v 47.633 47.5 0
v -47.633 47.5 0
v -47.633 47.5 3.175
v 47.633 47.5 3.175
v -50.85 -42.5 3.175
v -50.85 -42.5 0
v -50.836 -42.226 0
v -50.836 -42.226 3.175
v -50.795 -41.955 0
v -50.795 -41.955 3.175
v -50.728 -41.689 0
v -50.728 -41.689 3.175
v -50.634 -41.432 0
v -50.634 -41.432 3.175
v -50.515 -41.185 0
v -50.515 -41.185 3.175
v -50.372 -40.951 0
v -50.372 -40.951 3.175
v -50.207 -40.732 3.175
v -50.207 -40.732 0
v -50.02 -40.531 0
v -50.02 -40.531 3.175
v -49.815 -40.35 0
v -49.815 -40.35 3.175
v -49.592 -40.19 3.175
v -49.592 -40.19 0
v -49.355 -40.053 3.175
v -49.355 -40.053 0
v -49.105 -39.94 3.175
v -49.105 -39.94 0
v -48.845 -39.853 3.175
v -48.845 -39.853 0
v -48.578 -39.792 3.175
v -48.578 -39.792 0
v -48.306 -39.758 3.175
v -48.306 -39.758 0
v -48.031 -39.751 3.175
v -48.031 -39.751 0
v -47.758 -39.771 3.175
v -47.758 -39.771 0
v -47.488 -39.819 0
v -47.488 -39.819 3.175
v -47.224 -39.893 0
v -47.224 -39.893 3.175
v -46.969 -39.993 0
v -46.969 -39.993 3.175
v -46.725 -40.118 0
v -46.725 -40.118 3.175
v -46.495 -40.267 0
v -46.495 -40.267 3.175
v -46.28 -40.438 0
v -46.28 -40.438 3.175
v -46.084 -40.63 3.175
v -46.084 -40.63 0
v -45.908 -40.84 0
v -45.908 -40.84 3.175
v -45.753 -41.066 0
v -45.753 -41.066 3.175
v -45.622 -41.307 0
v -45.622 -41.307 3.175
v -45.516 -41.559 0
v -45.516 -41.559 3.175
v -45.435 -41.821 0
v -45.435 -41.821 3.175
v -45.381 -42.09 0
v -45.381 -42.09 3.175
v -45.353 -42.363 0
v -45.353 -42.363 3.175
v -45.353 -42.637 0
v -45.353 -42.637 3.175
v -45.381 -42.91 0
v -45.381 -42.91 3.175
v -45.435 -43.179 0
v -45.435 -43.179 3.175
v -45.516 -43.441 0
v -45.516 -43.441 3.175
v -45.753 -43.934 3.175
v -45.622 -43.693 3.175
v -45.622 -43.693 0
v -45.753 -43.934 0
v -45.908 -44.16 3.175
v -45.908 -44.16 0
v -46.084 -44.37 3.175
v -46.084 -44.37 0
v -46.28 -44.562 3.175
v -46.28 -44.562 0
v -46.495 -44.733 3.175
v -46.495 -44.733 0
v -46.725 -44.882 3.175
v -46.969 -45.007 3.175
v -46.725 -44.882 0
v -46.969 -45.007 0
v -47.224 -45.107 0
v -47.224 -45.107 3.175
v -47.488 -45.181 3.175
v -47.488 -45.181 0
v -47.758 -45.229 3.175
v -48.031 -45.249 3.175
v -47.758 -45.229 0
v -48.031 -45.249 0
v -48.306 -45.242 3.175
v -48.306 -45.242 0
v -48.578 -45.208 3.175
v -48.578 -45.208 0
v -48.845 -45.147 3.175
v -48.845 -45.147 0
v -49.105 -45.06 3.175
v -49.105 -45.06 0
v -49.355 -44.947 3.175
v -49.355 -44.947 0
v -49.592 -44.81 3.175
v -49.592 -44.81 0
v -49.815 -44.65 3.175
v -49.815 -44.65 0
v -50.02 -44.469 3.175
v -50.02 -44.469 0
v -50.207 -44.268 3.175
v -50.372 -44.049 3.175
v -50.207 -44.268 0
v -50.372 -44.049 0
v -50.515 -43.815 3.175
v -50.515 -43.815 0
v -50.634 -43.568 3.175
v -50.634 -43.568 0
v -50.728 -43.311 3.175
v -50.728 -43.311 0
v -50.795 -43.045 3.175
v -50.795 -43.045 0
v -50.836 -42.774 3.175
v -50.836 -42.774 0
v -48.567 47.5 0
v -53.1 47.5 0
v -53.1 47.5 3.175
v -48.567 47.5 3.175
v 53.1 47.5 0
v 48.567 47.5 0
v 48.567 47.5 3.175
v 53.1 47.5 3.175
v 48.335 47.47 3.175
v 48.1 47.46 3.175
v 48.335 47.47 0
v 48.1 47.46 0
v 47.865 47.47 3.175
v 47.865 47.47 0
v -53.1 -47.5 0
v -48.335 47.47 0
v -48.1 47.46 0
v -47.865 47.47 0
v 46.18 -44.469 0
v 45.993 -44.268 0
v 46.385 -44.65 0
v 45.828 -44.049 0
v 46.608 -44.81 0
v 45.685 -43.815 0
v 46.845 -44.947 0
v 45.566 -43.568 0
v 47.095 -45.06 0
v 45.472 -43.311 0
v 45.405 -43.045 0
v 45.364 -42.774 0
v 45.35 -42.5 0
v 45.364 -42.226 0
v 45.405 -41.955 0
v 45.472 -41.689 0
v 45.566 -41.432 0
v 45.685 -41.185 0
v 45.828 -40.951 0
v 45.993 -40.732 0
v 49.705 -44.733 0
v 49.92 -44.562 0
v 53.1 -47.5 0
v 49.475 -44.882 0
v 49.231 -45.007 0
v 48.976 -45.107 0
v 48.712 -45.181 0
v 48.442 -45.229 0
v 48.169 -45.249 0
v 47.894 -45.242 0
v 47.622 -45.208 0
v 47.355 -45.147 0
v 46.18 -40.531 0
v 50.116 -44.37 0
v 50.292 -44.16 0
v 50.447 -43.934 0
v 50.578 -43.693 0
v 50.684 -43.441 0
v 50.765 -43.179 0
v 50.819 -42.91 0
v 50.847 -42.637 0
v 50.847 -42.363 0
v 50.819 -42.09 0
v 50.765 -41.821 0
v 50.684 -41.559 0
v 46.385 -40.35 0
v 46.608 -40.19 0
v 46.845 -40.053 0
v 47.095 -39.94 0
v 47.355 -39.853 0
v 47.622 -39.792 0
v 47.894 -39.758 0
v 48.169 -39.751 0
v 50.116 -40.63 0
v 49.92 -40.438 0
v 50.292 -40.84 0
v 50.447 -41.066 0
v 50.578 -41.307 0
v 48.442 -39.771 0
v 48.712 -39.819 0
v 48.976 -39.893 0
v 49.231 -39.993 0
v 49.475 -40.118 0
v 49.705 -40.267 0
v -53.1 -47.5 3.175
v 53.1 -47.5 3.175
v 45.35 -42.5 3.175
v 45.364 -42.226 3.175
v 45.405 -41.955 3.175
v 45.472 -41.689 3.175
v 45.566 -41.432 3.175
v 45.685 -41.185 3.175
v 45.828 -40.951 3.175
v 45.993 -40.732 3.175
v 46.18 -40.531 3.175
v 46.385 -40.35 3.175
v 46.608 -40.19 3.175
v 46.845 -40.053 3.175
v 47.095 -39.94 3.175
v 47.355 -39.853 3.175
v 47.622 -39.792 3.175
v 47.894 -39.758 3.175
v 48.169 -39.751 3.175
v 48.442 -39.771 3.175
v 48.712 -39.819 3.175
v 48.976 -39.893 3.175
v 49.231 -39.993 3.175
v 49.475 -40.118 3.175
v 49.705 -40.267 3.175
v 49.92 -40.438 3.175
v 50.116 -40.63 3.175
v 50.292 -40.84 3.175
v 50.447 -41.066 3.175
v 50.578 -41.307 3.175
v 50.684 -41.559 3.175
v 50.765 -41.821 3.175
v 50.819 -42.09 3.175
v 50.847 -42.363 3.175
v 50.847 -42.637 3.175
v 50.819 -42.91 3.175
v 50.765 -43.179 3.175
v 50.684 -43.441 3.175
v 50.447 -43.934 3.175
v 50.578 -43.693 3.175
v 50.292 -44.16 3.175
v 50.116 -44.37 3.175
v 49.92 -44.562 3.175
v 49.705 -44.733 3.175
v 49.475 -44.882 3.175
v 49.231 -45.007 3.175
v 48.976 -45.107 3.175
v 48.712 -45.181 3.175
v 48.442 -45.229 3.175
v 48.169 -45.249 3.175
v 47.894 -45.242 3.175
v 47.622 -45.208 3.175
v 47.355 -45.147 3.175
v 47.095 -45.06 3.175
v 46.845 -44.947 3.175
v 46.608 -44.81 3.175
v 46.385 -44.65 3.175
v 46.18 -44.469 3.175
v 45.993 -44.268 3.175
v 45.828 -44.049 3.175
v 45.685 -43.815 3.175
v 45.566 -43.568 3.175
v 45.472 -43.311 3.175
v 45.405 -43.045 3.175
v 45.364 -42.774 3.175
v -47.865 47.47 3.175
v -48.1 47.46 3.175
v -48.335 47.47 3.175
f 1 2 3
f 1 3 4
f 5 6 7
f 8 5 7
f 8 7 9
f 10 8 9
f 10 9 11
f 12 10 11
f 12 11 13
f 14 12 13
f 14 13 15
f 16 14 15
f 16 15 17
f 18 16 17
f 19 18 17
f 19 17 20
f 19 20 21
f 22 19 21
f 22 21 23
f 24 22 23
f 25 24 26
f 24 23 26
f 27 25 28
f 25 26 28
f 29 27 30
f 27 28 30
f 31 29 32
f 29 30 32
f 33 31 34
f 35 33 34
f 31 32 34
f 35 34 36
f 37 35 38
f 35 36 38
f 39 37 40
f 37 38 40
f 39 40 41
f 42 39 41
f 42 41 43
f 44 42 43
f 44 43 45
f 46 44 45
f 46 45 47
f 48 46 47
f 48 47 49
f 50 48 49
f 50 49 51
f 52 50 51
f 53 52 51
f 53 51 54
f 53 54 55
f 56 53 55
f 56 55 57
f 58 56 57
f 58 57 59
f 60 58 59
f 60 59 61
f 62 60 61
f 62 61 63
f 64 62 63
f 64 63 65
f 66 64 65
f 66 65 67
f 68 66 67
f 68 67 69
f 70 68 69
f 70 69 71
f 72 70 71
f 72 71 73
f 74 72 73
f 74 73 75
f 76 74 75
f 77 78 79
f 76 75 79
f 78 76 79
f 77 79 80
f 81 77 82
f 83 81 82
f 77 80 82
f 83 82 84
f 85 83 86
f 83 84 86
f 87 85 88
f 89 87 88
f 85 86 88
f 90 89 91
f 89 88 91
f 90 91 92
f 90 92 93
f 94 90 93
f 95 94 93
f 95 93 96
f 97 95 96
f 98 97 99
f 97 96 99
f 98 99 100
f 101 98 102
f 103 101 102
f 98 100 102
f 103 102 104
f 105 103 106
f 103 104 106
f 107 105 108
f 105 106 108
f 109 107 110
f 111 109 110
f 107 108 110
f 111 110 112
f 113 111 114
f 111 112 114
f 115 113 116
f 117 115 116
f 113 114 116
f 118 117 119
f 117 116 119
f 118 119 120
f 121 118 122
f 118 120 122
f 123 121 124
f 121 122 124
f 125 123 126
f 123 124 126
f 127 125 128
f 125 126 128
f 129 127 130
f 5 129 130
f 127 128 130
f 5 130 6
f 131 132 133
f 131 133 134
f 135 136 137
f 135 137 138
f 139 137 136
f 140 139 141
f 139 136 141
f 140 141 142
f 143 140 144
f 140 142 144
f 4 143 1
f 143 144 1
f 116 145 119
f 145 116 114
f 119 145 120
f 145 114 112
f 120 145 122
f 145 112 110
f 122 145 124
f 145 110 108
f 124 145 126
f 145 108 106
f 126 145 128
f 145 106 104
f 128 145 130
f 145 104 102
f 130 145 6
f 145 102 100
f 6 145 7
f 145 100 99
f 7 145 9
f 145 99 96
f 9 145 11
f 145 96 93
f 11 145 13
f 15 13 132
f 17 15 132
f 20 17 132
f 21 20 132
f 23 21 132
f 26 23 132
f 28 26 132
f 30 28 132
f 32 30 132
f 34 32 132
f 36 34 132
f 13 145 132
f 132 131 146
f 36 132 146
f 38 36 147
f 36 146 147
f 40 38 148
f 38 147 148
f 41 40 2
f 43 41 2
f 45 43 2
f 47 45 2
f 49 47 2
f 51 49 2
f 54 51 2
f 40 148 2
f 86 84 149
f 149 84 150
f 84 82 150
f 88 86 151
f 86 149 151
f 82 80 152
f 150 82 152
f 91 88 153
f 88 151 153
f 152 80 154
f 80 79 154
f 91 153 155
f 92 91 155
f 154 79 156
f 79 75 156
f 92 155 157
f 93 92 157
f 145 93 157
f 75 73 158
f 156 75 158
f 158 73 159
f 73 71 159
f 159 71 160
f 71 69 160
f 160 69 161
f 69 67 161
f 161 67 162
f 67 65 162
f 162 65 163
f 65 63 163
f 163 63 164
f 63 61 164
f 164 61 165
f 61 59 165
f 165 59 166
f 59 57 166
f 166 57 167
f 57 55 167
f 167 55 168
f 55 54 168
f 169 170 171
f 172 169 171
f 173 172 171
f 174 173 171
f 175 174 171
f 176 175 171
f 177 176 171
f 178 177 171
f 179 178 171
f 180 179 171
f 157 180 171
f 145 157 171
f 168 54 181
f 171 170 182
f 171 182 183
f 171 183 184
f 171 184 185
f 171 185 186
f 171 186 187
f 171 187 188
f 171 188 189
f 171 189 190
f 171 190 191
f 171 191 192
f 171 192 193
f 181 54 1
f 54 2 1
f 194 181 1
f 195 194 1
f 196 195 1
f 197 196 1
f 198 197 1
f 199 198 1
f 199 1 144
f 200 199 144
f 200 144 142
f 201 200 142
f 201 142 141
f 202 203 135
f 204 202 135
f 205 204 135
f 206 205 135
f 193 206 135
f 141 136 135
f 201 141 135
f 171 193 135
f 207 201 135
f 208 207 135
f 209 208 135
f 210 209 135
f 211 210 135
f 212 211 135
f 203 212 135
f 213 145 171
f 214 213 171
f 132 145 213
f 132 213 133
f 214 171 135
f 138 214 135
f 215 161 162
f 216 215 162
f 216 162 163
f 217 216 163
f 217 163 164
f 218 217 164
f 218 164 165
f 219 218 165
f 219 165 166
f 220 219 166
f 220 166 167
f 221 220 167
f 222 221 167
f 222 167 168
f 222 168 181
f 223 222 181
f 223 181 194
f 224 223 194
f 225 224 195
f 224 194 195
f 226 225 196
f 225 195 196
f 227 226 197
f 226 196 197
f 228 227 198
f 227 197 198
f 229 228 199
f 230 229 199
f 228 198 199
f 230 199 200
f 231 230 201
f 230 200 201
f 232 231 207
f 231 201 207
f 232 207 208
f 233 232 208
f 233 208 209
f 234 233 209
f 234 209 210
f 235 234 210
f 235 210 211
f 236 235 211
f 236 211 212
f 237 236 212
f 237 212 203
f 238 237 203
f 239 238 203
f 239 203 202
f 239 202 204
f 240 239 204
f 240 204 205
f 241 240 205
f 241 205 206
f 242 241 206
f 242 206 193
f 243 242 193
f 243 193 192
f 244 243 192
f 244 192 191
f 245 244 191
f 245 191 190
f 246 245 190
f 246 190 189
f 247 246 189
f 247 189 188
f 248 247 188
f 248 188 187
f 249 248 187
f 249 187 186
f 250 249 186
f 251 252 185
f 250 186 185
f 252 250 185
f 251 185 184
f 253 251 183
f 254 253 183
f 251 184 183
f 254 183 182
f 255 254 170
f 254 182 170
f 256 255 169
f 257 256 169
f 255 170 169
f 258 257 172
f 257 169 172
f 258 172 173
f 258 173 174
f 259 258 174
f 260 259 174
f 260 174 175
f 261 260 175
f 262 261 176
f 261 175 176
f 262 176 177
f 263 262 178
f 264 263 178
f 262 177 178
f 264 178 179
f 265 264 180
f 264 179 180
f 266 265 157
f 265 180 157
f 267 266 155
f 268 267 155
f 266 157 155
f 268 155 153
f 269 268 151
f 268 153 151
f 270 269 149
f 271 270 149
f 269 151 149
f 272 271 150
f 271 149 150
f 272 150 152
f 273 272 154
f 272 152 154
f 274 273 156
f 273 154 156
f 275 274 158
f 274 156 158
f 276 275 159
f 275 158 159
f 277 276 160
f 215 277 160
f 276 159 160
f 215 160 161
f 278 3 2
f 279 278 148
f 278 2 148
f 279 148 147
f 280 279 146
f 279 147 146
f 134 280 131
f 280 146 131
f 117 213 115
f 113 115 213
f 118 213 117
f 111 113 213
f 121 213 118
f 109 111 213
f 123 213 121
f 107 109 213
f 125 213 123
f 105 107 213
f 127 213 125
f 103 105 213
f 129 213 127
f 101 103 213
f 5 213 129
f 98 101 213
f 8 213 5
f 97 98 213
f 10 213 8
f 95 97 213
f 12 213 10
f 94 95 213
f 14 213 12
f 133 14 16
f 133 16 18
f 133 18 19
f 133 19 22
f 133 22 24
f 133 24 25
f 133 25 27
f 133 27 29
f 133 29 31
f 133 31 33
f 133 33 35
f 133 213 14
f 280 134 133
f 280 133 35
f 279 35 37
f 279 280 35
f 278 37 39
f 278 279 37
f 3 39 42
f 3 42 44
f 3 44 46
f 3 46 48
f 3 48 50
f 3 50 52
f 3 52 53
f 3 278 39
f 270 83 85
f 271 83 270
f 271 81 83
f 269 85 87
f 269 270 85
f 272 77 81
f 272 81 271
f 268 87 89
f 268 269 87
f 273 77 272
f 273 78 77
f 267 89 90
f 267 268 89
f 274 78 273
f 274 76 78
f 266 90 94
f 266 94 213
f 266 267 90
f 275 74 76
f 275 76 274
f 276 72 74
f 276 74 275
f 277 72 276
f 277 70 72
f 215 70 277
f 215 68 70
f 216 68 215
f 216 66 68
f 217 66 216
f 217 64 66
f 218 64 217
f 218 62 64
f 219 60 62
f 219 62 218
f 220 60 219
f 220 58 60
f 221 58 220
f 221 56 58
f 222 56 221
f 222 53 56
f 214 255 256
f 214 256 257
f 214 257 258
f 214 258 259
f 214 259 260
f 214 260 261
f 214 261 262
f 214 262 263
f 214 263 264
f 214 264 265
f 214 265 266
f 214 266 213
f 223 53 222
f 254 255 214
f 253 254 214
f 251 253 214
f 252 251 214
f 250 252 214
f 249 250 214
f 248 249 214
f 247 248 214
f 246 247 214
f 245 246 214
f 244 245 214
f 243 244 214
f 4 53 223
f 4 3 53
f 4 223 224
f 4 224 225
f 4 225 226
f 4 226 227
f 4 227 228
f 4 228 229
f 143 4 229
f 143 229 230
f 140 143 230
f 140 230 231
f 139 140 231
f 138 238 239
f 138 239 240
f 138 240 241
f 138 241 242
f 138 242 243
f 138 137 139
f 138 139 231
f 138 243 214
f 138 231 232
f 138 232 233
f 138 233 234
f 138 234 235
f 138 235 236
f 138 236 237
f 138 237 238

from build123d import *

# Parameters (mm, degrees)
SKETCH1_W           = 106.2
SKETCH1_H           = 95
BOSS_EXTRUDE1_DEPTH = 3.175
CUT_EXTRUDE1_REACH  = 73.316
SKETCH2_R           = 2.75


with BuildPart() as part:
    # Sketch1 → Boss-Extrude1 (new body)
    with BuildSketch(Plane.XY):
        Rectangle(SKETCH1_W, SKETCH1_H)
    extrude(amount=BOSS_EXTRUDE1_DEPTH)

    # Sketch2 → Cut-Extrude1 (cut, up to next)
    with BuildSketch(Plane(origin=(0, 0, 0), x_dir=(-1, 0, 0), z_dir=(0, 0, -1)), mode=Mode.PRIVATE) as cut_extrude1_sk1:
        with Locations((-48.1, 50.21)):
            Circle(SKETCH2_R)
    cut_extrude1_tool1 = extrude(cut_extrude1_sk1.sketch, amount=-CUT_EXTRUDE1_REACH, mode=Mode.PRIVATE) & part.part
    # Sketch2 → Cut-Extrude1 (cut, up to next)
    with BuildSketch(Plane(origin=(0, 0, 0), x_dir=(-1, 0, 0), z_dir=(0, 0, -1)), mode=Mode.PRIVATE) as cut_extrude1_sk2:
        with Locations((-48.1, -42.5)):
            Circle(SKETCH2_R)
    cut_extrude1_tool2 = extrude(cut_extrude1_sk2.sketch, amount=-CUT_EXTRUDE1_REACH, mode=Mode.PRIVATE) & part.part
    # Sketch2 → Cut-Extrude1 (cut, up to next)
    with BuildSketch(Plane(origin=(0, 0, 0), x_dir=(-1, 0, 0), z_dir=(0, 0, -1)), mode=Mode.PRIVATE) as cut_extrude1_sk3:
        with Locations((48.1, -42.5)):
            Circle(SKETCH2_R)
    cut_extrude1_tool3 = extrude(cut_extrude1_sk3.sketch, amount=-CUT_EXTRUDE1_REACH, mode=Mode.PRIVATE) & part.part
    # Sketch2 → Cut-Extrude1 (cut, up to next)
    with BuildSketch(Plane(origin=(0, 0, 0), x_dir=(-1, 0, 0), z_dir=(0, 0, -1)), mode=Mode.PRIVATE) as cut_extrude1_sk4:
        with Locations((48.1, 50.21)):
            Circle(SKETCH2_R)
    cut_extrude1_tool4 = extrude(cut_extrude1_sk4.sketch, amount=-CUT_EXTRUDE1_REACH, mode=Mode.PRIVATE) & part.part
    add(cut_extrude1_tool1.solids().sort_by_distance((48.1, 50.21, 0))[0], mode=Mode.SUBTRACT)
    add(cut_extrude1_tool2.solids().sort_by_distance((48.1, -42.5, 0))[0], mode=Mode.SUBTRACT)
    add(cut_extrude1_tool3.solids().sort_by_distance((-48.1, -42.5, 0))[0], mode=Mode.SUBTRACT)
    add(cut_extrude1_tool4.solids().sort_by_distance((-48.1, 50.21, 0))[0], mode=Mode.SUBTRACT)


solid = part.part
